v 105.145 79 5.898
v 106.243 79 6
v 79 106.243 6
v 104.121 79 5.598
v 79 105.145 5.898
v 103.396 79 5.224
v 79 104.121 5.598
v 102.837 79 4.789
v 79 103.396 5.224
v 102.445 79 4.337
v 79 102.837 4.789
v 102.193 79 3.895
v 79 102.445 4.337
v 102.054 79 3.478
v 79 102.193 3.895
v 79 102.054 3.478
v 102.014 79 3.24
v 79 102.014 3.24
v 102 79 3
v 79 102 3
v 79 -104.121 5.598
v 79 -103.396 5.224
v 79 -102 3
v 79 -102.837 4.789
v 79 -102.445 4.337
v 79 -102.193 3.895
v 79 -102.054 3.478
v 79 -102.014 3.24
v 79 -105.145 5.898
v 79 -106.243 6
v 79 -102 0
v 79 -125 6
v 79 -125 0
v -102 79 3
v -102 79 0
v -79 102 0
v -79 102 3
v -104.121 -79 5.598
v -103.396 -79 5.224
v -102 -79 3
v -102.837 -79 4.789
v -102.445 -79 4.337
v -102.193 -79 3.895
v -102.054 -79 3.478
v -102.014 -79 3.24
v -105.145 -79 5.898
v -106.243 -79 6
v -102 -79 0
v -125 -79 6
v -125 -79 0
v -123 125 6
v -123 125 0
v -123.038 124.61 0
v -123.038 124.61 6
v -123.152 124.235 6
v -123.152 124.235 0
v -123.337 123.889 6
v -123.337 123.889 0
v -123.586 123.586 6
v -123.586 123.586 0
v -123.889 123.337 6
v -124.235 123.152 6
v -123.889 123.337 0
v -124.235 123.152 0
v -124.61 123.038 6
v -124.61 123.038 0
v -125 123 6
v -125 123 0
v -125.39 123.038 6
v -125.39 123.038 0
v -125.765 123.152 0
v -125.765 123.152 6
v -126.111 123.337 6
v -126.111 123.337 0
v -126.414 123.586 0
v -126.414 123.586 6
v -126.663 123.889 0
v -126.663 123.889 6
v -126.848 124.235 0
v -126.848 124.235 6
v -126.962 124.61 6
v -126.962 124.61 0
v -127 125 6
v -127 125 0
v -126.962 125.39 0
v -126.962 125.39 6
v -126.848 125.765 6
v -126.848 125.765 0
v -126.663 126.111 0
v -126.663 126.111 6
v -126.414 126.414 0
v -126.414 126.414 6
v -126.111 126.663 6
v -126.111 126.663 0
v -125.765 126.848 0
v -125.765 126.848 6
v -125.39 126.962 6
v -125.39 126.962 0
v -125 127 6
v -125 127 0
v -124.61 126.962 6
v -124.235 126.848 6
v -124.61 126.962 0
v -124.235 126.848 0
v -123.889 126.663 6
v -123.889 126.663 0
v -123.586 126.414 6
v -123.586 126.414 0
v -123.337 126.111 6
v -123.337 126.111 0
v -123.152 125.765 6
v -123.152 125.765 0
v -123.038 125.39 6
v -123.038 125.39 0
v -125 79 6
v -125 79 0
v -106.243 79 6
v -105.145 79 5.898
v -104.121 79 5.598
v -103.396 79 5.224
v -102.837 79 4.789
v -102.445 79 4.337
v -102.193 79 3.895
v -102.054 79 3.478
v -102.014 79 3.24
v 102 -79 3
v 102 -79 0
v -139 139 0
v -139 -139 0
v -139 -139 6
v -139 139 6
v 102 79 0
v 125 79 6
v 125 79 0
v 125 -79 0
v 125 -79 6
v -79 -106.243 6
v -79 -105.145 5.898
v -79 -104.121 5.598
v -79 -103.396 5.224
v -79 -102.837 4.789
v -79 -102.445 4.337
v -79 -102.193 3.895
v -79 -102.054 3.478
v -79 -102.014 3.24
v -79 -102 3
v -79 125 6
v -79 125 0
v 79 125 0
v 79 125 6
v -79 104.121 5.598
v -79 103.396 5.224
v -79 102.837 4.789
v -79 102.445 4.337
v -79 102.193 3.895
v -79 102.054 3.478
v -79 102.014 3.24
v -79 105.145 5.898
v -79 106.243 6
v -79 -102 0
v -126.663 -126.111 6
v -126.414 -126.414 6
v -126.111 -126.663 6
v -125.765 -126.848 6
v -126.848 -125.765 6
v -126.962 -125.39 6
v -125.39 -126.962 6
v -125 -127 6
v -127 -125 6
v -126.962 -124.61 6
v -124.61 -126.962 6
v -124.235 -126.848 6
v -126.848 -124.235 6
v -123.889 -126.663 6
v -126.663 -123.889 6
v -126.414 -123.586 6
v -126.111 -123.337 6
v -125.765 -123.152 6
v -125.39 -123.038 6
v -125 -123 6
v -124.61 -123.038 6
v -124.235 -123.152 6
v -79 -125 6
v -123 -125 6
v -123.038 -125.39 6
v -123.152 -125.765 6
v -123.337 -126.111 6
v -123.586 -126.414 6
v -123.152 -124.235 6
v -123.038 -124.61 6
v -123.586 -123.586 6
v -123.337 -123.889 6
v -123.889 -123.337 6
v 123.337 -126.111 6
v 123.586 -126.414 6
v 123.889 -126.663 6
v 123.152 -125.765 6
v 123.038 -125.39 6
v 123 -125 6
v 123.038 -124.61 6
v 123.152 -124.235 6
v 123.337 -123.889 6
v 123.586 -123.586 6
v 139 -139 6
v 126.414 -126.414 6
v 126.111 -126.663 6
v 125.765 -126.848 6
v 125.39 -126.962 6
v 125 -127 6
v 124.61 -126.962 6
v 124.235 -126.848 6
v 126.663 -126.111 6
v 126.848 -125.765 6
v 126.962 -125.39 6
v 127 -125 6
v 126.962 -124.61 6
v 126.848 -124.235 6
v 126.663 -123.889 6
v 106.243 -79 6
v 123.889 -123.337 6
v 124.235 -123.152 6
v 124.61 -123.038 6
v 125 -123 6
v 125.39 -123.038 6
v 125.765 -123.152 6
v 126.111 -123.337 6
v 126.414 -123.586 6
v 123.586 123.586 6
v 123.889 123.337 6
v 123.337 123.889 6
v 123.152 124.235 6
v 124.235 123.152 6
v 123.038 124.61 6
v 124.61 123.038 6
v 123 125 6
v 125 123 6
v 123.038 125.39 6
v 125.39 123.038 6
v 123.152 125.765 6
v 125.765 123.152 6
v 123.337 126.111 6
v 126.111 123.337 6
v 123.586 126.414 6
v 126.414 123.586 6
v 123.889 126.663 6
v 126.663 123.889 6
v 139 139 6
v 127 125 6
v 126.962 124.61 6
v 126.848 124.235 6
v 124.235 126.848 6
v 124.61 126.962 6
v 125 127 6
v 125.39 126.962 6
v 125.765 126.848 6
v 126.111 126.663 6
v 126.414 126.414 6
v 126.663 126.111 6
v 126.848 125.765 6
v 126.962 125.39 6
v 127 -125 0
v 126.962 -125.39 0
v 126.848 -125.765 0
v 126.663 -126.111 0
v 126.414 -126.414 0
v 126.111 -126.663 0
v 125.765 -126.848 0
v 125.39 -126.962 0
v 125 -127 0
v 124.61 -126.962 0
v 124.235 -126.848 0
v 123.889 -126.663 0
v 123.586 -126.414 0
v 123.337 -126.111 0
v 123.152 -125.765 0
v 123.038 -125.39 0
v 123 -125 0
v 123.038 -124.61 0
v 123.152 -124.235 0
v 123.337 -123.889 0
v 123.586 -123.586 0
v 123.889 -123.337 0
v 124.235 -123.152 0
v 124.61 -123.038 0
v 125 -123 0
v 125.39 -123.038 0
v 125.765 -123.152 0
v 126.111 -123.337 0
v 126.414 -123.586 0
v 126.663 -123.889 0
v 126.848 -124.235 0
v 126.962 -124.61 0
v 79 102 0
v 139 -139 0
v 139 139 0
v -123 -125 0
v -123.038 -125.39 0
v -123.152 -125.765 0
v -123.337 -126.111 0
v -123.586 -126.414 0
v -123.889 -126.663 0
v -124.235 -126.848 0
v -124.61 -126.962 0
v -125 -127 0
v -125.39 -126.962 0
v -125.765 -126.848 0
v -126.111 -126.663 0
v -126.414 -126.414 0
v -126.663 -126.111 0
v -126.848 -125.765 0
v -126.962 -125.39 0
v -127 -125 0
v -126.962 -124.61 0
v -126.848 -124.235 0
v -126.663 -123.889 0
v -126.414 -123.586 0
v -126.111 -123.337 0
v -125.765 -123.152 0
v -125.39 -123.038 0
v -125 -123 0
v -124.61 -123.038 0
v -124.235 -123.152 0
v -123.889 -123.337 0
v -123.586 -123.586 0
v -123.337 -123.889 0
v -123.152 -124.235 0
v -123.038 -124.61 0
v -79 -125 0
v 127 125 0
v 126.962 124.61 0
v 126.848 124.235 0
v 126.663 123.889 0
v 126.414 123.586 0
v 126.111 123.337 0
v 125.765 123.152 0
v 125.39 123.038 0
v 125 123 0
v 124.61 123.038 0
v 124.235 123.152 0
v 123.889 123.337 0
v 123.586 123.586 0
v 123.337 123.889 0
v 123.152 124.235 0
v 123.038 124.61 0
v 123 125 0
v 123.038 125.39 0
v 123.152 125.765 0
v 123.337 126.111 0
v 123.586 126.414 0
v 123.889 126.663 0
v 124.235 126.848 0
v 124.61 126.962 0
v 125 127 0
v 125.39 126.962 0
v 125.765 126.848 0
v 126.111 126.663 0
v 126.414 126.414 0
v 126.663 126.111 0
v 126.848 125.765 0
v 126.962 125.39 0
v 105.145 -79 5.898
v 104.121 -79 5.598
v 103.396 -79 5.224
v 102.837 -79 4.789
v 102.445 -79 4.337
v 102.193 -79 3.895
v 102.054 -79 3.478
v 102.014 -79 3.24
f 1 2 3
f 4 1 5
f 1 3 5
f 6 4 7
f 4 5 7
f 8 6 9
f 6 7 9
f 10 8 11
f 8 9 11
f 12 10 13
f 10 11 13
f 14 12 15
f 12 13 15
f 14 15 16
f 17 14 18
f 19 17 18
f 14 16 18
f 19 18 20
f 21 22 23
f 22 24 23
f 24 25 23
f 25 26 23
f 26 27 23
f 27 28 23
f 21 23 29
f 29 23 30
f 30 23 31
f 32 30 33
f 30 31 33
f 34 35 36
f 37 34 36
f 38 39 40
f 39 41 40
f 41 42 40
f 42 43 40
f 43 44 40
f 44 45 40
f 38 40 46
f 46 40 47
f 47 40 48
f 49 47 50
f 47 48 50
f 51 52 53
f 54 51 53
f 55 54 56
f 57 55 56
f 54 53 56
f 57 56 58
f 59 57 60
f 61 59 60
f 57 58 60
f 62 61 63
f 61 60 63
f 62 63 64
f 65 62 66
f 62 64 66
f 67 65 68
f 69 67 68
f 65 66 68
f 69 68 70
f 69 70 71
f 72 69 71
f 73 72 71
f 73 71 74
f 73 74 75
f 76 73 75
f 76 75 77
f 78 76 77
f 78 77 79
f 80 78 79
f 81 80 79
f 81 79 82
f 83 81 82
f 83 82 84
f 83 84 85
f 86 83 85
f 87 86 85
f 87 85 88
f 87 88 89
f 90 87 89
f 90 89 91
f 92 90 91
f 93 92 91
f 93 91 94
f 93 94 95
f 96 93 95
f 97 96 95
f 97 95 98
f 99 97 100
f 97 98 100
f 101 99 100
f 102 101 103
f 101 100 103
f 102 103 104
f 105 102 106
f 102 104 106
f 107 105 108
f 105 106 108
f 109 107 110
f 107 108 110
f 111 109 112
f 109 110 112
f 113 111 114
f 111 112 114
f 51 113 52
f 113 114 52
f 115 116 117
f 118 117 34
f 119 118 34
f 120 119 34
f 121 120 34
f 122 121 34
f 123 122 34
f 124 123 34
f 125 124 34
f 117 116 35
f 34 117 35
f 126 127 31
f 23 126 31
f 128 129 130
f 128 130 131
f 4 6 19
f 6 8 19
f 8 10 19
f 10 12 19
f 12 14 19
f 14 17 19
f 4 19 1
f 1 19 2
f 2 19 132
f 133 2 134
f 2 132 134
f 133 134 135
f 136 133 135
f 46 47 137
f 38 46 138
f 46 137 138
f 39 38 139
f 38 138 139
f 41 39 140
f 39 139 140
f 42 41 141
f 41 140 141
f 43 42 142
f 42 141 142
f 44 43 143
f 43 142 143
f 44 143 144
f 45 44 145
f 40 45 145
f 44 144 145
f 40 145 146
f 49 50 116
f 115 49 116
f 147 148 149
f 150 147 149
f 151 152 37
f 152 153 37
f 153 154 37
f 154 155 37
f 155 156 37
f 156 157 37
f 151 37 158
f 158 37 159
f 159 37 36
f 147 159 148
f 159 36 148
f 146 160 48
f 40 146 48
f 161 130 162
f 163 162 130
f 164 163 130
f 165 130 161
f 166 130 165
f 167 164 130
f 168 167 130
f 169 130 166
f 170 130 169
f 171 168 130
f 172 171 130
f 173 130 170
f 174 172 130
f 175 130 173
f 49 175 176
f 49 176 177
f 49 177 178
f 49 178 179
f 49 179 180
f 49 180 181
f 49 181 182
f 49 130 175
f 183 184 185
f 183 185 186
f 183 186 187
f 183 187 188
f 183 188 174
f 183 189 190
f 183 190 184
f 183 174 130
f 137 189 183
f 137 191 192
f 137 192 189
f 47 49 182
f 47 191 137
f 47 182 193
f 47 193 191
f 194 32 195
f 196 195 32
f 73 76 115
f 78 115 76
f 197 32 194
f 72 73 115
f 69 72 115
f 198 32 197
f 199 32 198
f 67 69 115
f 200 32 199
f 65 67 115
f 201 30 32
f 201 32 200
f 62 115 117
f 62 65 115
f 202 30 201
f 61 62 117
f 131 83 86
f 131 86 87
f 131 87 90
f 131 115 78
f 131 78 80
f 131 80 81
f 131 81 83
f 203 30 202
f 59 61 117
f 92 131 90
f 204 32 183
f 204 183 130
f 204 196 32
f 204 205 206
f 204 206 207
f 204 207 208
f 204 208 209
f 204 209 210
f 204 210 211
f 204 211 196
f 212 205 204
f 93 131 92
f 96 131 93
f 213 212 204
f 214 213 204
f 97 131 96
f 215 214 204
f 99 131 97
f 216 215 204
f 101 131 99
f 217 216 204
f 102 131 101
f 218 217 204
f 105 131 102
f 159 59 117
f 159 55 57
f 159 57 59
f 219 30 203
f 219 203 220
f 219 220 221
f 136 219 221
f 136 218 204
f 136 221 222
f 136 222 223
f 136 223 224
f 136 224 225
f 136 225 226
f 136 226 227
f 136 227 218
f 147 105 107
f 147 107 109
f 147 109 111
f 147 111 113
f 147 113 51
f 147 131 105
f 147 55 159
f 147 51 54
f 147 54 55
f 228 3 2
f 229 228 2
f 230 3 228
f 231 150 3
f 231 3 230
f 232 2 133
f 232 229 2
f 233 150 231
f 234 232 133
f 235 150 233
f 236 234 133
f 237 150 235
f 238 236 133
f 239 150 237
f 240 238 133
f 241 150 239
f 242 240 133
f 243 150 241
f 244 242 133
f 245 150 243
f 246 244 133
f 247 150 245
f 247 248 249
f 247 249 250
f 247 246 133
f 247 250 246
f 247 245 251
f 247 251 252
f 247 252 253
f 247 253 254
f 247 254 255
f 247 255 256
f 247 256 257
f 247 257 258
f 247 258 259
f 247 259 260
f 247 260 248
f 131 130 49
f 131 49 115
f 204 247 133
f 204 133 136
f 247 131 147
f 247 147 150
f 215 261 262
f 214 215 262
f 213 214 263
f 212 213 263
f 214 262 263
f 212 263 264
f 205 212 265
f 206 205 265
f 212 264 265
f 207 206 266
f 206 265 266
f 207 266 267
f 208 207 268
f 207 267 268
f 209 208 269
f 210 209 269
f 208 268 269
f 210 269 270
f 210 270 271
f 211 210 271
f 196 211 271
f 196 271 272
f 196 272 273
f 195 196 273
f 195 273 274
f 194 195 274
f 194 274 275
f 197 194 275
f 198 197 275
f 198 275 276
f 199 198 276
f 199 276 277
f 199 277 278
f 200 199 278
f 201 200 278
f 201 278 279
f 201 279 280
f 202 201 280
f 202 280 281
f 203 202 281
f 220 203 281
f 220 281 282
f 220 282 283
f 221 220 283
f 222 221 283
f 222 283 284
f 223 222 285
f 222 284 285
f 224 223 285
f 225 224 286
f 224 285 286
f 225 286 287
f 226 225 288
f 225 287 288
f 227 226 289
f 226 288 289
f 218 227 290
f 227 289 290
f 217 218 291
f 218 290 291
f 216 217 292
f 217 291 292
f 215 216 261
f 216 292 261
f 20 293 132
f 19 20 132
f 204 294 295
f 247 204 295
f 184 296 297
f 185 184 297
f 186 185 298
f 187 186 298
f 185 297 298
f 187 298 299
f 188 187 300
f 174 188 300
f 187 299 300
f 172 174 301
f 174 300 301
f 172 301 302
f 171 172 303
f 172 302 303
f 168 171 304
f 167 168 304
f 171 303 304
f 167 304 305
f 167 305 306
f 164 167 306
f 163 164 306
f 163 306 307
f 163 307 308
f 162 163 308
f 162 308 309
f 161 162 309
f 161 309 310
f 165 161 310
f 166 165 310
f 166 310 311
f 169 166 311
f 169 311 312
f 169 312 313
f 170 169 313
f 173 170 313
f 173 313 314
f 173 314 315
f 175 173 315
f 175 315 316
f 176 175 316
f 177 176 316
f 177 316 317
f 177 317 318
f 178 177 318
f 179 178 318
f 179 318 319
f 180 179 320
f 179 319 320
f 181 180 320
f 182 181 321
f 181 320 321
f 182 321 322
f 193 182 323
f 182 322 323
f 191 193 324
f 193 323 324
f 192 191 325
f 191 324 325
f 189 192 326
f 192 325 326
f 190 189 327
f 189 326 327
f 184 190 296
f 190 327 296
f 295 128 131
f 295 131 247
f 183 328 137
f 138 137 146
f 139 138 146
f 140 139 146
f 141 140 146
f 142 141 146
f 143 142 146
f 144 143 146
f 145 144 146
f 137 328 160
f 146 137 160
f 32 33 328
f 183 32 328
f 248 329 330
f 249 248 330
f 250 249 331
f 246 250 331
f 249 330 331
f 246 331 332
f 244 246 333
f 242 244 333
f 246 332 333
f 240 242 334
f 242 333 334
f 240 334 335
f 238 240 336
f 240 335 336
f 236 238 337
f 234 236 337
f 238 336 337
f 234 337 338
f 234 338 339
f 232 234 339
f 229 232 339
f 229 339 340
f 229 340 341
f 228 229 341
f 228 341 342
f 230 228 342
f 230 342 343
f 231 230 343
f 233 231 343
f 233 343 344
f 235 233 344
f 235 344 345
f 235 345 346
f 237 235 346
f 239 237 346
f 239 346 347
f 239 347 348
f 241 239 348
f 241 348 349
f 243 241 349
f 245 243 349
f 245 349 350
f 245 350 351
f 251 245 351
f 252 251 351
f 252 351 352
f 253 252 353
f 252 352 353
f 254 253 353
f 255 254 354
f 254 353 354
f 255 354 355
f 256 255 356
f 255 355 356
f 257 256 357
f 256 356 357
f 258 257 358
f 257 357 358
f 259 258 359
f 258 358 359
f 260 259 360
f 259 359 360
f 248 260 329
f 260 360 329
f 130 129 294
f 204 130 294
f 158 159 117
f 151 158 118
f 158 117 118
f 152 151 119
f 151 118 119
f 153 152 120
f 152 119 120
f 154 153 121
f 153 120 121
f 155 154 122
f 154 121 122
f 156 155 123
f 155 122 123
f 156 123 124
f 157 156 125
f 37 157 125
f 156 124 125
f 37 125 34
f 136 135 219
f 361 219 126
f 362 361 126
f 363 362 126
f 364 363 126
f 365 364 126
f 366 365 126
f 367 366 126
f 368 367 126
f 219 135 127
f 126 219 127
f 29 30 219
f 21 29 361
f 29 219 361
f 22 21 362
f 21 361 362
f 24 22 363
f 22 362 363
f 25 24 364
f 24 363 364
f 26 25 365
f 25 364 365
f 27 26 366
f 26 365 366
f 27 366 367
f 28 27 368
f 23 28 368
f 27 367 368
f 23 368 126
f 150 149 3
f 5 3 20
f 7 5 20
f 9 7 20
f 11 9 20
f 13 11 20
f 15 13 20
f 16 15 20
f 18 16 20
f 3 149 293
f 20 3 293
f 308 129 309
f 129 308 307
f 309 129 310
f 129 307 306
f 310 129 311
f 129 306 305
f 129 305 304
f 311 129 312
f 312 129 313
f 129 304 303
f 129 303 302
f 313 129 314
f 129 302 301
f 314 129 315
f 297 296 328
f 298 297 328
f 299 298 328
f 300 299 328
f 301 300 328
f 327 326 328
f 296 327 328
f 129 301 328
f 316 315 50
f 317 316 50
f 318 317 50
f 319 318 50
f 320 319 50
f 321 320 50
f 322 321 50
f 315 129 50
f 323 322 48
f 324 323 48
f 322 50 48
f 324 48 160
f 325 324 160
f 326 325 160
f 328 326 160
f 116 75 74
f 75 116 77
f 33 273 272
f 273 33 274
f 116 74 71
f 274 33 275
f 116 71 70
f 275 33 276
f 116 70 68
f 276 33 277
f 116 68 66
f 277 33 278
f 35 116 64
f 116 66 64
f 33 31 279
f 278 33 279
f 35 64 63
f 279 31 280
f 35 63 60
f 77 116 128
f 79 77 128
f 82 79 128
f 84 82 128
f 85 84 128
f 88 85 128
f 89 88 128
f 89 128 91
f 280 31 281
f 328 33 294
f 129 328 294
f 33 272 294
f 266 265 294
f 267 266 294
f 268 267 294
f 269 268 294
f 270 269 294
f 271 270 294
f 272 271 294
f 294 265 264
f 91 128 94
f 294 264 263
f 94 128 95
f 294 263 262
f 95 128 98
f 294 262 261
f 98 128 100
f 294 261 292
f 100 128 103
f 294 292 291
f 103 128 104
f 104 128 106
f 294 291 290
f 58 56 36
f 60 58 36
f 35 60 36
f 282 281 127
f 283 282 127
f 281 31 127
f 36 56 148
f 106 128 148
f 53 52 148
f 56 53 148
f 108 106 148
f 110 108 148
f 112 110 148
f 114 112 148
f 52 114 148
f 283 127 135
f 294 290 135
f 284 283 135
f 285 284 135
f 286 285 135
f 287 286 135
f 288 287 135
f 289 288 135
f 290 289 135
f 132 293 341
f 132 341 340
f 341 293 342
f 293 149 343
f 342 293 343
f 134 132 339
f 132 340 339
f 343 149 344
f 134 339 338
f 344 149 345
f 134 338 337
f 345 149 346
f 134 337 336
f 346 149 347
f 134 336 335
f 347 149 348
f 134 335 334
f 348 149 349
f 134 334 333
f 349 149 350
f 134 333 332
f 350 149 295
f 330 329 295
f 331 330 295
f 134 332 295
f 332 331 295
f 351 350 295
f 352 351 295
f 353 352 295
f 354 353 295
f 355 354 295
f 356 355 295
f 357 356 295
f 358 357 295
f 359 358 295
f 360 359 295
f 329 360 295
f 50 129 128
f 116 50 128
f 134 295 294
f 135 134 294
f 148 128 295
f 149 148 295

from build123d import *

# Parameters (mm, degrees)
SKETCH002_W          = 278
SKETCH002_H          = 278
PAD002_DEPTH         = 6
POCKET_DEPTH         = 0.001
POCKET_DEPTH_BACK    = 6.001
SKETCH004_R          = 2
POCKET001_DEPTH      = 6.001
POCKET001_DEPTH_BACK = 0.001
FILLET_R             = 3


with BuildPart() as part:
    # Sketch002 → Pad002 (new body)
    with BuildSketch(Plane.XY):
        Rectangle(SKETCH002_W, SKETCH002_H)
    extrude(amount=PAD002_DEPTH)

    # Sketch003 → Pocket (cut, two sides)
    with BuildSketch(Plane.XY) as pocket_sk:
        Polygon((-79, 125), (79, 125), (79, 102), (102, 79), (125, 79), (125, -79), (102, -79), (79, -102), (79, -125), (-79, -125), (-79, -102), (-102, -79), (-125, -79), (-125, 79), (-102, 79), (-79, 102), align=None)
    extrude(amount=-POCKET_DEPTH, mode=Mode.SUBTRACT)
    extrude(pocket_sk.sketch, amount=POCKET_DEPTH_BACK, mode=Mode.SUBTRACT)

    # Sketch004 (on Face5 of Pad002) → Pocket001 (cut, two sides)
    with BuildSketch(Plane(origin=(0, 0, 0), x_dir=(1, 0, 0), z_dir=(0, 0, -1))) as pocket001_sk:
        with Locations((-125, 125)):
            Circle(SKETCH004_R)
        with Locations((125, 125)):
            Circle(SKETCH004_R)
        with Locations((125, -125)):
            Circle(SKETCH004_R)
        with Locations((-125, -125)):
            Circle(SKETCH004_R)
    extrude(amount=-POCKET001_DEPTH, mode=Mode.SUBTRACT)
    extrude(pocket001_sk.sketch, amount=POCKET001_DEPTH_BACK, mode=Mode.SUBTRACT)

    # Fillet
    fillet_edges = [part.edges().sort_by_distance(p)[0] for p in [
        (-90.5, -90.5, 6),
        (-90.5, 90.5, 6),
        (90.5, 90.5, 6),
        (90.5, -90.5, 6),
    ]]
    fillet(fillet_edges, radius=FILLET_R)


solid = part.part
